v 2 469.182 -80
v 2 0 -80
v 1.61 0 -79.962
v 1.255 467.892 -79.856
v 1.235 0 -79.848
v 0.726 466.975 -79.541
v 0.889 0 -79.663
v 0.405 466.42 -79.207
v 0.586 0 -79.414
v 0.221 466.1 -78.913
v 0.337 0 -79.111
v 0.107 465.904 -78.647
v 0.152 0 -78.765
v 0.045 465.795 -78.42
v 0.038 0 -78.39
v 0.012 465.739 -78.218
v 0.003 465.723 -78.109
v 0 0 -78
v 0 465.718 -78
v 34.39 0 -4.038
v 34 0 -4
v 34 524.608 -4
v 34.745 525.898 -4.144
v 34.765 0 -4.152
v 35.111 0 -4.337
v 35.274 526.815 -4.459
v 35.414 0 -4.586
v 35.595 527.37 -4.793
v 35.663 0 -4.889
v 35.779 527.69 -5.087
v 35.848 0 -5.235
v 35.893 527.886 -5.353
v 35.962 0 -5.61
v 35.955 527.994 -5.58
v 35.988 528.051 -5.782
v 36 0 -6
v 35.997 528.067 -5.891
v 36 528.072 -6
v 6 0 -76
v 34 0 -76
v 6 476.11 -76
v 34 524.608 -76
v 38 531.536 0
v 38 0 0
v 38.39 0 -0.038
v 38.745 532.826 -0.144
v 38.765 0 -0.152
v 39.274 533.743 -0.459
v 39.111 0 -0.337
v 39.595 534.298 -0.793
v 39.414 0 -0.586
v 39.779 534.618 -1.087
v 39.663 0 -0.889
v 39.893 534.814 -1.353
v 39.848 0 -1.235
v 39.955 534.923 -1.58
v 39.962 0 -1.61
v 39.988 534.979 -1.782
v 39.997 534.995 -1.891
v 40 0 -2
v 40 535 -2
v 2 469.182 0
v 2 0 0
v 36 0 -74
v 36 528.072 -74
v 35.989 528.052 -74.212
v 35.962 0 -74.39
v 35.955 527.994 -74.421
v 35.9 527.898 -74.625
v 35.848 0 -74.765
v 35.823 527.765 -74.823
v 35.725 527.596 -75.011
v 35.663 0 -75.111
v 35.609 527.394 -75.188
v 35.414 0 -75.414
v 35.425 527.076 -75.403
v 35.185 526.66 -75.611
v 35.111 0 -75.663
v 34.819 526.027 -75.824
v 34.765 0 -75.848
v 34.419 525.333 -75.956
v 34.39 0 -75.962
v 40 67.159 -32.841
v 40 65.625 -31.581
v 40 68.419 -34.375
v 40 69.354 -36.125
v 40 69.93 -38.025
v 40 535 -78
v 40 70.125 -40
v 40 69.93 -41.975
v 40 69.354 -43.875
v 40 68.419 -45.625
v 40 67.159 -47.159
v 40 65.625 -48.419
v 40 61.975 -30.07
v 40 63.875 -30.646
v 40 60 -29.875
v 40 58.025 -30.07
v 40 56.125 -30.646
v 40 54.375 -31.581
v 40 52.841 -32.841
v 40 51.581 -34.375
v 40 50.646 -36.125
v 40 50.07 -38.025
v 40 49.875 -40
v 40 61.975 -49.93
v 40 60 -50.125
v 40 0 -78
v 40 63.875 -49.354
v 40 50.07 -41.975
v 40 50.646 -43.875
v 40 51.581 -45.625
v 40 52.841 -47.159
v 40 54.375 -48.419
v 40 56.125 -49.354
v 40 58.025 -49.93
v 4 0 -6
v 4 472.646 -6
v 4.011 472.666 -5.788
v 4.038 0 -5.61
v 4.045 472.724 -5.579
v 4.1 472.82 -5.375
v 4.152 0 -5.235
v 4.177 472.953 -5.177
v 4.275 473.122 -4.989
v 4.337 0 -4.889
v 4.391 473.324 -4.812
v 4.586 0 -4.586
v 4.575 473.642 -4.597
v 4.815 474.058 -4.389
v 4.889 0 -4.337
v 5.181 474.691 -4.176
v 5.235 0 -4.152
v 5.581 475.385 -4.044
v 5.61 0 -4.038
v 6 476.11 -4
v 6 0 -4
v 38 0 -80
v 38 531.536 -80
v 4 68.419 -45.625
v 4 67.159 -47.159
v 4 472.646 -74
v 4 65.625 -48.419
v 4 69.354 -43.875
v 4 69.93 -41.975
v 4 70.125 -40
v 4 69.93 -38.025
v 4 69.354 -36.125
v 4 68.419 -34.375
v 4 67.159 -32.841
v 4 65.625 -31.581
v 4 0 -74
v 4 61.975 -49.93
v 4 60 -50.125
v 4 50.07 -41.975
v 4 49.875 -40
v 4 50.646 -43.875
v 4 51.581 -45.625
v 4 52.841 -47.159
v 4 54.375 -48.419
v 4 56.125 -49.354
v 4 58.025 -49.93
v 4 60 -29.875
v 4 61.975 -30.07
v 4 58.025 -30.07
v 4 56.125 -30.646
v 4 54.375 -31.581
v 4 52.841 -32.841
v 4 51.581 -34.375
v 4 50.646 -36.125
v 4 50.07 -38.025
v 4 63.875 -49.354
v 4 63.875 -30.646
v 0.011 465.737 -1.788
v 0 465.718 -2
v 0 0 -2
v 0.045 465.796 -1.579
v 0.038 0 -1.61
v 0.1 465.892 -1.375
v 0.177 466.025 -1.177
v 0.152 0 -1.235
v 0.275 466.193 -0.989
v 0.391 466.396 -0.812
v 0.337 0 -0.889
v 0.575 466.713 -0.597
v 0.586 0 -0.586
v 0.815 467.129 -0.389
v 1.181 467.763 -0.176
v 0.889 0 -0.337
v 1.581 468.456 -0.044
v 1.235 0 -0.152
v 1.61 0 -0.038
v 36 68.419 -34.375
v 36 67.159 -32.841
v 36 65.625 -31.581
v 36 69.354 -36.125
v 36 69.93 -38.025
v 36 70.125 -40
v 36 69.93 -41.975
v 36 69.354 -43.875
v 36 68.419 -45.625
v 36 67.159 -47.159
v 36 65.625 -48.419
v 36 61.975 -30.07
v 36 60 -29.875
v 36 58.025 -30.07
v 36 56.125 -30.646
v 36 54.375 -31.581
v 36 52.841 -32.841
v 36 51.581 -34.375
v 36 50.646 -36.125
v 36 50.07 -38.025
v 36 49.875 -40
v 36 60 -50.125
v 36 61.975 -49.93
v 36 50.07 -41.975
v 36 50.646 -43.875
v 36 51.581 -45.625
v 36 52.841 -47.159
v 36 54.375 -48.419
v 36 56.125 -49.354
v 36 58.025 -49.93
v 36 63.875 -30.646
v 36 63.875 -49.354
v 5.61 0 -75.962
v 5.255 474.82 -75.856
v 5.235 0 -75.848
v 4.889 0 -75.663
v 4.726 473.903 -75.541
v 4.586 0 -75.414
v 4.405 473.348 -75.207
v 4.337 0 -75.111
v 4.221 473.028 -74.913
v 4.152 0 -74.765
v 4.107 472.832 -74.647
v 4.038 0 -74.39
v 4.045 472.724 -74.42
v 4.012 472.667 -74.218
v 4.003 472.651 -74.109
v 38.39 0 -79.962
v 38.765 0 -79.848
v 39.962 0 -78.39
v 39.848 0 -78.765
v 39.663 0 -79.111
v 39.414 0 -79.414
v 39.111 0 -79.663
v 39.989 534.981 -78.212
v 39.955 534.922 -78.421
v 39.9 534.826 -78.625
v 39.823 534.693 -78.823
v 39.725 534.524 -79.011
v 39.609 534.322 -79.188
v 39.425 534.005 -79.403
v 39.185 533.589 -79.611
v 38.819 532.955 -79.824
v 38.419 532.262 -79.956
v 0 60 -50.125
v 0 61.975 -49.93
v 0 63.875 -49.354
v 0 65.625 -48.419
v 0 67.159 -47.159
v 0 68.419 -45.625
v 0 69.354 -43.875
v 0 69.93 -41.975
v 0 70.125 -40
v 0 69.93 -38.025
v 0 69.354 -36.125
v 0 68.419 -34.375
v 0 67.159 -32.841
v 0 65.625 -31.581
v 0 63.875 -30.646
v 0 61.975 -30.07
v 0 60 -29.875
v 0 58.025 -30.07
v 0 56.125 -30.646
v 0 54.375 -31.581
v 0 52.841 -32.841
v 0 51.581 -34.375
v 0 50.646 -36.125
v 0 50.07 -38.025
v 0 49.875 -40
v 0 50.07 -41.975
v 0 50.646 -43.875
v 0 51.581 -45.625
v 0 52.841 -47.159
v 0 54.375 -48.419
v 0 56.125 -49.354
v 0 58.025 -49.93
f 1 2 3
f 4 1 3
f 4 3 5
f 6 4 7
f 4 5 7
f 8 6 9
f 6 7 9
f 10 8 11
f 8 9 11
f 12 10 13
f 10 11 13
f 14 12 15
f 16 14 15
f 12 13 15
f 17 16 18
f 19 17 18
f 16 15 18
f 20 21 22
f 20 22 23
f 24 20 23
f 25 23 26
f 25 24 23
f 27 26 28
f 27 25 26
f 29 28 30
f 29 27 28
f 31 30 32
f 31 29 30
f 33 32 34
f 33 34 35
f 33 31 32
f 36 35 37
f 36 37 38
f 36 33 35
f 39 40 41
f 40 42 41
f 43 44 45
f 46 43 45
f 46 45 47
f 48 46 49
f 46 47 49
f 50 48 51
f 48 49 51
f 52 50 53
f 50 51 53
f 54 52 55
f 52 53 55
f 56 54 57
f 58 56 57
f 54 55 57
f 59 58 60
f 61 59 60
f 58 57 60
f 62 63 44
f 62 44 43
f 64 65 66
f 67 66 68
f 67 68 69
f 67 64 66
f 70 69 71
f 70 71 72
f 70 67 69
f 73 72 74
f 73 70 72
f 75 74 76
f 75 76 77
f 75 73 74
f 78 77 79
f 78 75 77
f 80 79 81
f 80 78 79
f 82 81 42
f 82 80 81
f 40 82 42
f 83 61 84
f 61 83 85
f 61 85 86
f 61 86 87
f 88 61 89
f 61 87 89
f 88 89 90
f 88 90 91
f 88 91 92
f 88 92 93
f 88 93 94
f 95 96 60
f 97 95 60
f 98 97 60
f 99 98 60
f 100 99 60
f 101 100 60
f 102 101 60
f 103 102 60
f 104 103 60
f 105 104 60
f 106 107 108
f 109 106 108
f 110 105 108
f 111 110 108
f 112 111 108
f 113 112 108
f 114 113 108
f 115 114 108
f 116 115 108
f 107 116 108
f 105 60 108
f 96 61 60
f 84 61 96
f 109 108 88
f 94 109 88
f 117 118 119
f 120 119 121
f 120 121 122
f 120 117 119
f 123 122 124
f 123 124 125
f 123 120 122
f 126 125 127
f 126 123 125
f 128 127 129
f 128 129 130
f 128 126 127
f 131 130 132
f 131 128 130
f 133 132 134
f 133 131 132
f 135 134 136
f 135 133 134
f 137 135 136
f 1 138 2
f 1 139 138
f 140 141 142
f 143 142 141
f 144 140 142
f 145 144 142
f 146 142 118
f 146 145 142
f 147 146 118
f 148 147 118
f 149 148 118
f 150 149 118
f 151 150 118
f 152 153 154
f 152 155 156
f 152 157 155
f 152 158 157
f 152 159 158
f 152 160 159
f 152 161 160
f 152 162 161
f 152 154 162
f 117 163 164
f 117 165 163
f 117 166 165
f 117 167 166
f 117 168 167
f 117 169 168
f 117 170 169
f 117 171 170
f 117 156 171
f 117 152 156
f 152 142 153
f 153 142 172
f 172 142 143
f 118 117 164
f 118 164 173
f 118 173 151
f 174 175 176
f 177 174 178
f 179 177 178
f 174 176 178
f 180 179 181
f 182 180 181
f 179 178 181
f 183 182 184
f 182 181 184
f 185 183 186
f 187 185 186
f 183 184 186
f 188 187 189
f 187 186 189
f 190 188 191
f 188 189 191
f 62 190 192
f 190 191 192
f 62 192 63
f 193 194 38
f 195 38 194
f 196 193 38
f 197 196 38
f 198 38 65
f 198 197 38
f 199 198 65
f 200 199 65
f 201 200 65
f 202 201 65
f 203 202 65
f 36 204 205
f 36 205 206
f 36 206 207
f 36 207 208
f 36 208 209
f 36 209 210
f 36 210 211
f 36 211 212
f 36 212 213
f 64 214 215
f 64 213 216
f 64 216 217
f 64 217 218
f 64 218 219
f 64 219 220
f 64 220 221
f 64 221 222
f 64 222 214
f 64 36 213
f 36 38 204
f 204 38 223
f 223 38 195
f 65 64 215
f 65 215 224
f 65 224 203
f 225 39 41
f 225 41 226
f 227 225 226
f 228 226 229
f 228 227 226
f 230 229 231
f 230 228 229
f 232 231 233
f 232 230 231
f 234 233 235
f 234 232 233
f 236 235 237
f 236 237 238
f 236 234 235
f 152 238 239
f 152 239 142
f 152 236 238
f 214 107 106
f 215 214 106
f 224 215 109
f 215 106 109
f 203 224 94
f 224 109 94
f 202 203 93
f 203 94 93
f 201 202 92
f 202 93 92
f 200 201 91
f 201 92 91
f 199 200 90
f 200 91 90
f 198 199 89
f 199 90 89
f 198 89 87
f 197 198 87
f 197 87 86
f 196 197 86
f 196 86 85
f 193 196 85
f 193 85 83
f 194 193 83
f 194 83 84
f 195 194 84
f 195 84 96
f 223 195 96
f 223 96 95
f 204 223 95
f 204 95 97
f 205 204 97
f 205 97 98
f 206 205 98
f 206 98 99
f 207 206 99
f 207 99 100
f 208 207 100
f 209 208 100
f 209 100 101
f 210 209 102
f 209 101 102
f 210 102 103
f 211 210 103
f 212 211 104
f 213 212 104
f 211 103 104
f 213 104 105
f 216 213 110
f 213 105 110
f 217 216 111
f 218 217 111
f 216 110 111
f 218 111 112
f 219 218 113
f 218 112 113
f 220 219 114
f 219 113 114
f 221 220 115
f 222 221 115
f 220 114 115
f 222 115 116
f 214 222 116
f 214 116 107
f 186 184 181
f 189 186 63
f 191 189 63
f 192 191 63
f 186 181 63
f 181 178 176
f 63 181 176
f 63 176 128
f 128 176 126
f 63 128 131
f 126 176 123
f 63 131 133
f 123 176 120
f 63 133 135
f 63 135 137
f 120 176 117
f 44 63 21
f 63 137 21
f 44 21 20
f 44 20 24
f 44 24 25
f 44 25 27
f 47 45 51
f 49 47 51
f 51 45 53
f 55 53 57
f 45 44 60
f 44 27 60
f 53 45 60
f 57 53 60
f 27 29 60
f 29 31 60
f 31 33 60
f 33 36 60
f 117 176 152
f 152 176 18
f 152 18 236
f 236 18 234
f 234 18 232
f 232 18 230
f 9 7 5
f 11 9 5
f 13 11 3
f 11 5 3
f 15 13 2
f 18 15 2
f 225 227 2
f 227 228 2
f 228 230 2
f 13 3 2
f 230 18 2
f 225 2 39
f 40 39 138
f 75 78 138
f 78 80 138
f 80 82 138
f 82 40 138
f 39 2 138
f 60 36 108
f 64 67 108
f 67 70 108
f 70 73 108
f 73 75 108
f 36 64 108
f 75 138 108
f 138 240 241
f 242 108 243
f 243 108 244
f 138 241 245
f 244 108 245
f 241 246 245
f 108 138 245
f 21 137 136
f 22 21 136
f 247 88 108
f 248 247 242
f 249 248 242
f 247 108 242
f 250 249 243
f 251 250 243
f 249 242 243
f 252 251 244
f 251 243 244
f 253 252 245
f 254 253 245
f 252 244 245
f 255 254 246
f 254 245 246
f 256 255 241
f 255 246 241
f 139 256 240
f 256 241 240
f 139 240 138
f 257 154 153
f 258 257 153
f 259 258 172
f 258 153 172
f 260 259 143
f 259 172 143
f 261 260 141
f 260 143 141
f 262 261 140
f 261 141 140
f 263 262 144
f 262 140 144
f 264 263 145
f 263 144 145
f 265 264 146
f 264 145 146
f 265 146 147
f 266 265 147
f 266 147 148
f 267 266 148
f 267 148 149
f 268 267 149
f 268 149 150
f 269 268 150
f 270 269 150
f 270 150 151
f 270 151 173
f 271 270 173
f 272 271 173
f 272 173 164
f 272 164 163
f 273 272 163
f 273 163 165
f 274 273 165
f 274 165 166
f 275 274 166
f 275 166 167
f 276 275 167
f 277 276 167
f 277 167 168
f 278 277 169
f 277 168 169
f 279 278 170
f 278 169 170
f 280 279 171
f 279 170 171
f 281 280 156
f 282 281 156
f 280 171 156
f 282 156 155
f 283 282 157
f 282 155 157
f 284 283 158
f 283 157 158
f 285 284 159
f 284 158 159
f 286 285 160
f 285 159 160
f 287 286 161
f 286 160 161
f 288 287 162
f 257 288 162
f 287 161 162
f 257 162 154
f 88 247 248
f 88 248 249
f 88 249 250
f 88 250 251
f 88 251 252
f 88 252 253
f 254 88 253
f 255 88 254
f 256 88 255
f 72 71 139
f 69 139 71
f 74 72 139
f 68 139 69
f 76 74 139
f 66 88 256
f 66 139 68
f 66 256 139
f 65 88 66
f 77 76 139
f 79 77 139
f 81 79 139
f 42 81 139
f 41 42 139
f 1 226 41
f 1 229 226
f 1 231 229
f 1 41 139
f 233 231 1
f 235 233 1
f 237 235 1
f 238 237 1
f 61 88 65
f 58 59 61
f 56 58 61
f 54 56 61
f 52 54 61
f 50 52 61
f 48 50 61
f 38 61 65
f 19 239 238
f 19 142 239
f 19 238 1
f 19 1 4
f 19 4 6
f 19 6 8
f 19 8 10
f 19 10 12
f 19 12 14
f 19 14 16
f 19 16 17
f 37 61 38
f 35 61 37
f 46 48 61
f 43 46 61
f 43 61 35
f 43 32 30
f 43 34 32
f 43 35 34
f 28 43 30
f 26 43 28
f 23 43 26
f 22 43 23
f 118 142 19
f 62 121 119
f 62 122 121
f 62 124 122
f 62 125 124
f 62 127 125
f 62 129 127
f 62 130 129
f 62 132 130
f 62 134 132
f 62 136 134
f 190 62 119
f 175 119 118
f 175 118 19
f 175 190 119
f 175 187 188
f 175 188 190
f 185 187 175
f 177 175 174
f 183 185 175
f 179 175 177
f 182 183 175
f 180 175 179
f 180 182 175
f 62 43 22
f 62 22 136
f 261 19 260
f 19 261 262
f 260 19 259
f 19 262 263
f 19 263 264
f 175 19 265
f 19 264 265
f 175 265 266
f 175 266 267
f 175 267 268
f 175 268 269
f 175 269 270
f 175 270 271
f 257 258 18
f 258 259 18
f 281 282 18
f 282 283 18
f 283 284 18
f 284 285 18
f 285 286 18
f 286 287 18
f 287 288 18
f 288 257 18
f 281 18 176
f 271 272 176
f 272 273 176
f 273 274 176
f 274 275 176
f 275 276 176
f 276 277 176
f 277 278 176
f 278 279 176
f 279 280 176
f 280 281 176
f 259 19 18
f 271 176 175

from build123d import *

# Parameters (mm, degrees)
BOSS_EXTRU_1_DEPTH      = 675
ESQUISSE3_R             = 10.125
ESQUISSE3_R_2           = 12.5
ENL_V_MAT_EXTRU_1_DEPTH = 681.900139521
ENL_V_MAT_EXTRU_2_DEPTH = 681.900139521


with BuildPart() as part:
    # Esquisse2 → Boss.-Extru.1 (new body)
    with BuildSketch(Plane(origin=(0, 0, 0), x_dir=(1, 0, 0), z_dir=(0, 1, 0))):
        with BuildLine():
            Line((2, 0), (38, 0))
            ThreePointArc((38, 0), (39.414213562, 0.585786438), (40, 2))
            Line((40, 2), (40, 78))
            ThreePointArc((40, 78), (39.414213562, 79.414213562), (38, 80))
            Line((38, 80), (2, 80))
            ThreePointArc((2, 80), (0.585786438, 79.414213562), (0, 78))
            Line((0, 78), (0, 2))
            ThreePointArc((0, 2), (0.585786438, 0.585786438), (2, 0))
        make_face()
        with BuildLine():
            Line((6, 4), (34, 4))
            ThreePointArc((34, 4), (35.414213562, 4.585786438), (36, 6))
            Line((36, 6), (36, 74))
            ThreePointArc((36, 74), (35.414213562, 75.414213562), (34, 76))
            Line((34, 76), (6, 76))
            ThreePointArc((6, 76), (4.585786438, 75.414213562), (4, 74))
            Line((4, 74), (4, 6))
            ThreePointArc((4, 6), (4.585786438, 4.585786438), (6, 4))
        make_face(mode=Mode.SUBTRACT)
    extrude(amount=BOSS_EXTRU_1_DEPTH)

    # Esquisse3 → Enlèv. mat.-Extru.1 (cut, through all)
    with BuildSketch(Plane(origin=(40, 0, 0), x_dir=(0, 0, -1), z_dir=(1, 0, 0))):
        with Locations((40, 60)):
            Circle(ESQUISSE3_R)
        with Locations((40, 635)):
            Circle(ESQUISSE3_R_2)
    extrude(amount=-ENL_V_MAT_EXTRU_1_DEPTH, mode=Mode.SUBTRACT)

    # Esquisse4 → Enlèv. mat.-Extru.2 (cut, through all)
    with BuildSketch(Plane.XY):
        Polygon((0, 675), (40, 675), (40, 535), (0, 465.717967697), align=None)
    extrude(amount=-ENL_V_MAT_EXTRU_2_DEPTH, mode=Mode.SUBTRACT)


solid = part.part
